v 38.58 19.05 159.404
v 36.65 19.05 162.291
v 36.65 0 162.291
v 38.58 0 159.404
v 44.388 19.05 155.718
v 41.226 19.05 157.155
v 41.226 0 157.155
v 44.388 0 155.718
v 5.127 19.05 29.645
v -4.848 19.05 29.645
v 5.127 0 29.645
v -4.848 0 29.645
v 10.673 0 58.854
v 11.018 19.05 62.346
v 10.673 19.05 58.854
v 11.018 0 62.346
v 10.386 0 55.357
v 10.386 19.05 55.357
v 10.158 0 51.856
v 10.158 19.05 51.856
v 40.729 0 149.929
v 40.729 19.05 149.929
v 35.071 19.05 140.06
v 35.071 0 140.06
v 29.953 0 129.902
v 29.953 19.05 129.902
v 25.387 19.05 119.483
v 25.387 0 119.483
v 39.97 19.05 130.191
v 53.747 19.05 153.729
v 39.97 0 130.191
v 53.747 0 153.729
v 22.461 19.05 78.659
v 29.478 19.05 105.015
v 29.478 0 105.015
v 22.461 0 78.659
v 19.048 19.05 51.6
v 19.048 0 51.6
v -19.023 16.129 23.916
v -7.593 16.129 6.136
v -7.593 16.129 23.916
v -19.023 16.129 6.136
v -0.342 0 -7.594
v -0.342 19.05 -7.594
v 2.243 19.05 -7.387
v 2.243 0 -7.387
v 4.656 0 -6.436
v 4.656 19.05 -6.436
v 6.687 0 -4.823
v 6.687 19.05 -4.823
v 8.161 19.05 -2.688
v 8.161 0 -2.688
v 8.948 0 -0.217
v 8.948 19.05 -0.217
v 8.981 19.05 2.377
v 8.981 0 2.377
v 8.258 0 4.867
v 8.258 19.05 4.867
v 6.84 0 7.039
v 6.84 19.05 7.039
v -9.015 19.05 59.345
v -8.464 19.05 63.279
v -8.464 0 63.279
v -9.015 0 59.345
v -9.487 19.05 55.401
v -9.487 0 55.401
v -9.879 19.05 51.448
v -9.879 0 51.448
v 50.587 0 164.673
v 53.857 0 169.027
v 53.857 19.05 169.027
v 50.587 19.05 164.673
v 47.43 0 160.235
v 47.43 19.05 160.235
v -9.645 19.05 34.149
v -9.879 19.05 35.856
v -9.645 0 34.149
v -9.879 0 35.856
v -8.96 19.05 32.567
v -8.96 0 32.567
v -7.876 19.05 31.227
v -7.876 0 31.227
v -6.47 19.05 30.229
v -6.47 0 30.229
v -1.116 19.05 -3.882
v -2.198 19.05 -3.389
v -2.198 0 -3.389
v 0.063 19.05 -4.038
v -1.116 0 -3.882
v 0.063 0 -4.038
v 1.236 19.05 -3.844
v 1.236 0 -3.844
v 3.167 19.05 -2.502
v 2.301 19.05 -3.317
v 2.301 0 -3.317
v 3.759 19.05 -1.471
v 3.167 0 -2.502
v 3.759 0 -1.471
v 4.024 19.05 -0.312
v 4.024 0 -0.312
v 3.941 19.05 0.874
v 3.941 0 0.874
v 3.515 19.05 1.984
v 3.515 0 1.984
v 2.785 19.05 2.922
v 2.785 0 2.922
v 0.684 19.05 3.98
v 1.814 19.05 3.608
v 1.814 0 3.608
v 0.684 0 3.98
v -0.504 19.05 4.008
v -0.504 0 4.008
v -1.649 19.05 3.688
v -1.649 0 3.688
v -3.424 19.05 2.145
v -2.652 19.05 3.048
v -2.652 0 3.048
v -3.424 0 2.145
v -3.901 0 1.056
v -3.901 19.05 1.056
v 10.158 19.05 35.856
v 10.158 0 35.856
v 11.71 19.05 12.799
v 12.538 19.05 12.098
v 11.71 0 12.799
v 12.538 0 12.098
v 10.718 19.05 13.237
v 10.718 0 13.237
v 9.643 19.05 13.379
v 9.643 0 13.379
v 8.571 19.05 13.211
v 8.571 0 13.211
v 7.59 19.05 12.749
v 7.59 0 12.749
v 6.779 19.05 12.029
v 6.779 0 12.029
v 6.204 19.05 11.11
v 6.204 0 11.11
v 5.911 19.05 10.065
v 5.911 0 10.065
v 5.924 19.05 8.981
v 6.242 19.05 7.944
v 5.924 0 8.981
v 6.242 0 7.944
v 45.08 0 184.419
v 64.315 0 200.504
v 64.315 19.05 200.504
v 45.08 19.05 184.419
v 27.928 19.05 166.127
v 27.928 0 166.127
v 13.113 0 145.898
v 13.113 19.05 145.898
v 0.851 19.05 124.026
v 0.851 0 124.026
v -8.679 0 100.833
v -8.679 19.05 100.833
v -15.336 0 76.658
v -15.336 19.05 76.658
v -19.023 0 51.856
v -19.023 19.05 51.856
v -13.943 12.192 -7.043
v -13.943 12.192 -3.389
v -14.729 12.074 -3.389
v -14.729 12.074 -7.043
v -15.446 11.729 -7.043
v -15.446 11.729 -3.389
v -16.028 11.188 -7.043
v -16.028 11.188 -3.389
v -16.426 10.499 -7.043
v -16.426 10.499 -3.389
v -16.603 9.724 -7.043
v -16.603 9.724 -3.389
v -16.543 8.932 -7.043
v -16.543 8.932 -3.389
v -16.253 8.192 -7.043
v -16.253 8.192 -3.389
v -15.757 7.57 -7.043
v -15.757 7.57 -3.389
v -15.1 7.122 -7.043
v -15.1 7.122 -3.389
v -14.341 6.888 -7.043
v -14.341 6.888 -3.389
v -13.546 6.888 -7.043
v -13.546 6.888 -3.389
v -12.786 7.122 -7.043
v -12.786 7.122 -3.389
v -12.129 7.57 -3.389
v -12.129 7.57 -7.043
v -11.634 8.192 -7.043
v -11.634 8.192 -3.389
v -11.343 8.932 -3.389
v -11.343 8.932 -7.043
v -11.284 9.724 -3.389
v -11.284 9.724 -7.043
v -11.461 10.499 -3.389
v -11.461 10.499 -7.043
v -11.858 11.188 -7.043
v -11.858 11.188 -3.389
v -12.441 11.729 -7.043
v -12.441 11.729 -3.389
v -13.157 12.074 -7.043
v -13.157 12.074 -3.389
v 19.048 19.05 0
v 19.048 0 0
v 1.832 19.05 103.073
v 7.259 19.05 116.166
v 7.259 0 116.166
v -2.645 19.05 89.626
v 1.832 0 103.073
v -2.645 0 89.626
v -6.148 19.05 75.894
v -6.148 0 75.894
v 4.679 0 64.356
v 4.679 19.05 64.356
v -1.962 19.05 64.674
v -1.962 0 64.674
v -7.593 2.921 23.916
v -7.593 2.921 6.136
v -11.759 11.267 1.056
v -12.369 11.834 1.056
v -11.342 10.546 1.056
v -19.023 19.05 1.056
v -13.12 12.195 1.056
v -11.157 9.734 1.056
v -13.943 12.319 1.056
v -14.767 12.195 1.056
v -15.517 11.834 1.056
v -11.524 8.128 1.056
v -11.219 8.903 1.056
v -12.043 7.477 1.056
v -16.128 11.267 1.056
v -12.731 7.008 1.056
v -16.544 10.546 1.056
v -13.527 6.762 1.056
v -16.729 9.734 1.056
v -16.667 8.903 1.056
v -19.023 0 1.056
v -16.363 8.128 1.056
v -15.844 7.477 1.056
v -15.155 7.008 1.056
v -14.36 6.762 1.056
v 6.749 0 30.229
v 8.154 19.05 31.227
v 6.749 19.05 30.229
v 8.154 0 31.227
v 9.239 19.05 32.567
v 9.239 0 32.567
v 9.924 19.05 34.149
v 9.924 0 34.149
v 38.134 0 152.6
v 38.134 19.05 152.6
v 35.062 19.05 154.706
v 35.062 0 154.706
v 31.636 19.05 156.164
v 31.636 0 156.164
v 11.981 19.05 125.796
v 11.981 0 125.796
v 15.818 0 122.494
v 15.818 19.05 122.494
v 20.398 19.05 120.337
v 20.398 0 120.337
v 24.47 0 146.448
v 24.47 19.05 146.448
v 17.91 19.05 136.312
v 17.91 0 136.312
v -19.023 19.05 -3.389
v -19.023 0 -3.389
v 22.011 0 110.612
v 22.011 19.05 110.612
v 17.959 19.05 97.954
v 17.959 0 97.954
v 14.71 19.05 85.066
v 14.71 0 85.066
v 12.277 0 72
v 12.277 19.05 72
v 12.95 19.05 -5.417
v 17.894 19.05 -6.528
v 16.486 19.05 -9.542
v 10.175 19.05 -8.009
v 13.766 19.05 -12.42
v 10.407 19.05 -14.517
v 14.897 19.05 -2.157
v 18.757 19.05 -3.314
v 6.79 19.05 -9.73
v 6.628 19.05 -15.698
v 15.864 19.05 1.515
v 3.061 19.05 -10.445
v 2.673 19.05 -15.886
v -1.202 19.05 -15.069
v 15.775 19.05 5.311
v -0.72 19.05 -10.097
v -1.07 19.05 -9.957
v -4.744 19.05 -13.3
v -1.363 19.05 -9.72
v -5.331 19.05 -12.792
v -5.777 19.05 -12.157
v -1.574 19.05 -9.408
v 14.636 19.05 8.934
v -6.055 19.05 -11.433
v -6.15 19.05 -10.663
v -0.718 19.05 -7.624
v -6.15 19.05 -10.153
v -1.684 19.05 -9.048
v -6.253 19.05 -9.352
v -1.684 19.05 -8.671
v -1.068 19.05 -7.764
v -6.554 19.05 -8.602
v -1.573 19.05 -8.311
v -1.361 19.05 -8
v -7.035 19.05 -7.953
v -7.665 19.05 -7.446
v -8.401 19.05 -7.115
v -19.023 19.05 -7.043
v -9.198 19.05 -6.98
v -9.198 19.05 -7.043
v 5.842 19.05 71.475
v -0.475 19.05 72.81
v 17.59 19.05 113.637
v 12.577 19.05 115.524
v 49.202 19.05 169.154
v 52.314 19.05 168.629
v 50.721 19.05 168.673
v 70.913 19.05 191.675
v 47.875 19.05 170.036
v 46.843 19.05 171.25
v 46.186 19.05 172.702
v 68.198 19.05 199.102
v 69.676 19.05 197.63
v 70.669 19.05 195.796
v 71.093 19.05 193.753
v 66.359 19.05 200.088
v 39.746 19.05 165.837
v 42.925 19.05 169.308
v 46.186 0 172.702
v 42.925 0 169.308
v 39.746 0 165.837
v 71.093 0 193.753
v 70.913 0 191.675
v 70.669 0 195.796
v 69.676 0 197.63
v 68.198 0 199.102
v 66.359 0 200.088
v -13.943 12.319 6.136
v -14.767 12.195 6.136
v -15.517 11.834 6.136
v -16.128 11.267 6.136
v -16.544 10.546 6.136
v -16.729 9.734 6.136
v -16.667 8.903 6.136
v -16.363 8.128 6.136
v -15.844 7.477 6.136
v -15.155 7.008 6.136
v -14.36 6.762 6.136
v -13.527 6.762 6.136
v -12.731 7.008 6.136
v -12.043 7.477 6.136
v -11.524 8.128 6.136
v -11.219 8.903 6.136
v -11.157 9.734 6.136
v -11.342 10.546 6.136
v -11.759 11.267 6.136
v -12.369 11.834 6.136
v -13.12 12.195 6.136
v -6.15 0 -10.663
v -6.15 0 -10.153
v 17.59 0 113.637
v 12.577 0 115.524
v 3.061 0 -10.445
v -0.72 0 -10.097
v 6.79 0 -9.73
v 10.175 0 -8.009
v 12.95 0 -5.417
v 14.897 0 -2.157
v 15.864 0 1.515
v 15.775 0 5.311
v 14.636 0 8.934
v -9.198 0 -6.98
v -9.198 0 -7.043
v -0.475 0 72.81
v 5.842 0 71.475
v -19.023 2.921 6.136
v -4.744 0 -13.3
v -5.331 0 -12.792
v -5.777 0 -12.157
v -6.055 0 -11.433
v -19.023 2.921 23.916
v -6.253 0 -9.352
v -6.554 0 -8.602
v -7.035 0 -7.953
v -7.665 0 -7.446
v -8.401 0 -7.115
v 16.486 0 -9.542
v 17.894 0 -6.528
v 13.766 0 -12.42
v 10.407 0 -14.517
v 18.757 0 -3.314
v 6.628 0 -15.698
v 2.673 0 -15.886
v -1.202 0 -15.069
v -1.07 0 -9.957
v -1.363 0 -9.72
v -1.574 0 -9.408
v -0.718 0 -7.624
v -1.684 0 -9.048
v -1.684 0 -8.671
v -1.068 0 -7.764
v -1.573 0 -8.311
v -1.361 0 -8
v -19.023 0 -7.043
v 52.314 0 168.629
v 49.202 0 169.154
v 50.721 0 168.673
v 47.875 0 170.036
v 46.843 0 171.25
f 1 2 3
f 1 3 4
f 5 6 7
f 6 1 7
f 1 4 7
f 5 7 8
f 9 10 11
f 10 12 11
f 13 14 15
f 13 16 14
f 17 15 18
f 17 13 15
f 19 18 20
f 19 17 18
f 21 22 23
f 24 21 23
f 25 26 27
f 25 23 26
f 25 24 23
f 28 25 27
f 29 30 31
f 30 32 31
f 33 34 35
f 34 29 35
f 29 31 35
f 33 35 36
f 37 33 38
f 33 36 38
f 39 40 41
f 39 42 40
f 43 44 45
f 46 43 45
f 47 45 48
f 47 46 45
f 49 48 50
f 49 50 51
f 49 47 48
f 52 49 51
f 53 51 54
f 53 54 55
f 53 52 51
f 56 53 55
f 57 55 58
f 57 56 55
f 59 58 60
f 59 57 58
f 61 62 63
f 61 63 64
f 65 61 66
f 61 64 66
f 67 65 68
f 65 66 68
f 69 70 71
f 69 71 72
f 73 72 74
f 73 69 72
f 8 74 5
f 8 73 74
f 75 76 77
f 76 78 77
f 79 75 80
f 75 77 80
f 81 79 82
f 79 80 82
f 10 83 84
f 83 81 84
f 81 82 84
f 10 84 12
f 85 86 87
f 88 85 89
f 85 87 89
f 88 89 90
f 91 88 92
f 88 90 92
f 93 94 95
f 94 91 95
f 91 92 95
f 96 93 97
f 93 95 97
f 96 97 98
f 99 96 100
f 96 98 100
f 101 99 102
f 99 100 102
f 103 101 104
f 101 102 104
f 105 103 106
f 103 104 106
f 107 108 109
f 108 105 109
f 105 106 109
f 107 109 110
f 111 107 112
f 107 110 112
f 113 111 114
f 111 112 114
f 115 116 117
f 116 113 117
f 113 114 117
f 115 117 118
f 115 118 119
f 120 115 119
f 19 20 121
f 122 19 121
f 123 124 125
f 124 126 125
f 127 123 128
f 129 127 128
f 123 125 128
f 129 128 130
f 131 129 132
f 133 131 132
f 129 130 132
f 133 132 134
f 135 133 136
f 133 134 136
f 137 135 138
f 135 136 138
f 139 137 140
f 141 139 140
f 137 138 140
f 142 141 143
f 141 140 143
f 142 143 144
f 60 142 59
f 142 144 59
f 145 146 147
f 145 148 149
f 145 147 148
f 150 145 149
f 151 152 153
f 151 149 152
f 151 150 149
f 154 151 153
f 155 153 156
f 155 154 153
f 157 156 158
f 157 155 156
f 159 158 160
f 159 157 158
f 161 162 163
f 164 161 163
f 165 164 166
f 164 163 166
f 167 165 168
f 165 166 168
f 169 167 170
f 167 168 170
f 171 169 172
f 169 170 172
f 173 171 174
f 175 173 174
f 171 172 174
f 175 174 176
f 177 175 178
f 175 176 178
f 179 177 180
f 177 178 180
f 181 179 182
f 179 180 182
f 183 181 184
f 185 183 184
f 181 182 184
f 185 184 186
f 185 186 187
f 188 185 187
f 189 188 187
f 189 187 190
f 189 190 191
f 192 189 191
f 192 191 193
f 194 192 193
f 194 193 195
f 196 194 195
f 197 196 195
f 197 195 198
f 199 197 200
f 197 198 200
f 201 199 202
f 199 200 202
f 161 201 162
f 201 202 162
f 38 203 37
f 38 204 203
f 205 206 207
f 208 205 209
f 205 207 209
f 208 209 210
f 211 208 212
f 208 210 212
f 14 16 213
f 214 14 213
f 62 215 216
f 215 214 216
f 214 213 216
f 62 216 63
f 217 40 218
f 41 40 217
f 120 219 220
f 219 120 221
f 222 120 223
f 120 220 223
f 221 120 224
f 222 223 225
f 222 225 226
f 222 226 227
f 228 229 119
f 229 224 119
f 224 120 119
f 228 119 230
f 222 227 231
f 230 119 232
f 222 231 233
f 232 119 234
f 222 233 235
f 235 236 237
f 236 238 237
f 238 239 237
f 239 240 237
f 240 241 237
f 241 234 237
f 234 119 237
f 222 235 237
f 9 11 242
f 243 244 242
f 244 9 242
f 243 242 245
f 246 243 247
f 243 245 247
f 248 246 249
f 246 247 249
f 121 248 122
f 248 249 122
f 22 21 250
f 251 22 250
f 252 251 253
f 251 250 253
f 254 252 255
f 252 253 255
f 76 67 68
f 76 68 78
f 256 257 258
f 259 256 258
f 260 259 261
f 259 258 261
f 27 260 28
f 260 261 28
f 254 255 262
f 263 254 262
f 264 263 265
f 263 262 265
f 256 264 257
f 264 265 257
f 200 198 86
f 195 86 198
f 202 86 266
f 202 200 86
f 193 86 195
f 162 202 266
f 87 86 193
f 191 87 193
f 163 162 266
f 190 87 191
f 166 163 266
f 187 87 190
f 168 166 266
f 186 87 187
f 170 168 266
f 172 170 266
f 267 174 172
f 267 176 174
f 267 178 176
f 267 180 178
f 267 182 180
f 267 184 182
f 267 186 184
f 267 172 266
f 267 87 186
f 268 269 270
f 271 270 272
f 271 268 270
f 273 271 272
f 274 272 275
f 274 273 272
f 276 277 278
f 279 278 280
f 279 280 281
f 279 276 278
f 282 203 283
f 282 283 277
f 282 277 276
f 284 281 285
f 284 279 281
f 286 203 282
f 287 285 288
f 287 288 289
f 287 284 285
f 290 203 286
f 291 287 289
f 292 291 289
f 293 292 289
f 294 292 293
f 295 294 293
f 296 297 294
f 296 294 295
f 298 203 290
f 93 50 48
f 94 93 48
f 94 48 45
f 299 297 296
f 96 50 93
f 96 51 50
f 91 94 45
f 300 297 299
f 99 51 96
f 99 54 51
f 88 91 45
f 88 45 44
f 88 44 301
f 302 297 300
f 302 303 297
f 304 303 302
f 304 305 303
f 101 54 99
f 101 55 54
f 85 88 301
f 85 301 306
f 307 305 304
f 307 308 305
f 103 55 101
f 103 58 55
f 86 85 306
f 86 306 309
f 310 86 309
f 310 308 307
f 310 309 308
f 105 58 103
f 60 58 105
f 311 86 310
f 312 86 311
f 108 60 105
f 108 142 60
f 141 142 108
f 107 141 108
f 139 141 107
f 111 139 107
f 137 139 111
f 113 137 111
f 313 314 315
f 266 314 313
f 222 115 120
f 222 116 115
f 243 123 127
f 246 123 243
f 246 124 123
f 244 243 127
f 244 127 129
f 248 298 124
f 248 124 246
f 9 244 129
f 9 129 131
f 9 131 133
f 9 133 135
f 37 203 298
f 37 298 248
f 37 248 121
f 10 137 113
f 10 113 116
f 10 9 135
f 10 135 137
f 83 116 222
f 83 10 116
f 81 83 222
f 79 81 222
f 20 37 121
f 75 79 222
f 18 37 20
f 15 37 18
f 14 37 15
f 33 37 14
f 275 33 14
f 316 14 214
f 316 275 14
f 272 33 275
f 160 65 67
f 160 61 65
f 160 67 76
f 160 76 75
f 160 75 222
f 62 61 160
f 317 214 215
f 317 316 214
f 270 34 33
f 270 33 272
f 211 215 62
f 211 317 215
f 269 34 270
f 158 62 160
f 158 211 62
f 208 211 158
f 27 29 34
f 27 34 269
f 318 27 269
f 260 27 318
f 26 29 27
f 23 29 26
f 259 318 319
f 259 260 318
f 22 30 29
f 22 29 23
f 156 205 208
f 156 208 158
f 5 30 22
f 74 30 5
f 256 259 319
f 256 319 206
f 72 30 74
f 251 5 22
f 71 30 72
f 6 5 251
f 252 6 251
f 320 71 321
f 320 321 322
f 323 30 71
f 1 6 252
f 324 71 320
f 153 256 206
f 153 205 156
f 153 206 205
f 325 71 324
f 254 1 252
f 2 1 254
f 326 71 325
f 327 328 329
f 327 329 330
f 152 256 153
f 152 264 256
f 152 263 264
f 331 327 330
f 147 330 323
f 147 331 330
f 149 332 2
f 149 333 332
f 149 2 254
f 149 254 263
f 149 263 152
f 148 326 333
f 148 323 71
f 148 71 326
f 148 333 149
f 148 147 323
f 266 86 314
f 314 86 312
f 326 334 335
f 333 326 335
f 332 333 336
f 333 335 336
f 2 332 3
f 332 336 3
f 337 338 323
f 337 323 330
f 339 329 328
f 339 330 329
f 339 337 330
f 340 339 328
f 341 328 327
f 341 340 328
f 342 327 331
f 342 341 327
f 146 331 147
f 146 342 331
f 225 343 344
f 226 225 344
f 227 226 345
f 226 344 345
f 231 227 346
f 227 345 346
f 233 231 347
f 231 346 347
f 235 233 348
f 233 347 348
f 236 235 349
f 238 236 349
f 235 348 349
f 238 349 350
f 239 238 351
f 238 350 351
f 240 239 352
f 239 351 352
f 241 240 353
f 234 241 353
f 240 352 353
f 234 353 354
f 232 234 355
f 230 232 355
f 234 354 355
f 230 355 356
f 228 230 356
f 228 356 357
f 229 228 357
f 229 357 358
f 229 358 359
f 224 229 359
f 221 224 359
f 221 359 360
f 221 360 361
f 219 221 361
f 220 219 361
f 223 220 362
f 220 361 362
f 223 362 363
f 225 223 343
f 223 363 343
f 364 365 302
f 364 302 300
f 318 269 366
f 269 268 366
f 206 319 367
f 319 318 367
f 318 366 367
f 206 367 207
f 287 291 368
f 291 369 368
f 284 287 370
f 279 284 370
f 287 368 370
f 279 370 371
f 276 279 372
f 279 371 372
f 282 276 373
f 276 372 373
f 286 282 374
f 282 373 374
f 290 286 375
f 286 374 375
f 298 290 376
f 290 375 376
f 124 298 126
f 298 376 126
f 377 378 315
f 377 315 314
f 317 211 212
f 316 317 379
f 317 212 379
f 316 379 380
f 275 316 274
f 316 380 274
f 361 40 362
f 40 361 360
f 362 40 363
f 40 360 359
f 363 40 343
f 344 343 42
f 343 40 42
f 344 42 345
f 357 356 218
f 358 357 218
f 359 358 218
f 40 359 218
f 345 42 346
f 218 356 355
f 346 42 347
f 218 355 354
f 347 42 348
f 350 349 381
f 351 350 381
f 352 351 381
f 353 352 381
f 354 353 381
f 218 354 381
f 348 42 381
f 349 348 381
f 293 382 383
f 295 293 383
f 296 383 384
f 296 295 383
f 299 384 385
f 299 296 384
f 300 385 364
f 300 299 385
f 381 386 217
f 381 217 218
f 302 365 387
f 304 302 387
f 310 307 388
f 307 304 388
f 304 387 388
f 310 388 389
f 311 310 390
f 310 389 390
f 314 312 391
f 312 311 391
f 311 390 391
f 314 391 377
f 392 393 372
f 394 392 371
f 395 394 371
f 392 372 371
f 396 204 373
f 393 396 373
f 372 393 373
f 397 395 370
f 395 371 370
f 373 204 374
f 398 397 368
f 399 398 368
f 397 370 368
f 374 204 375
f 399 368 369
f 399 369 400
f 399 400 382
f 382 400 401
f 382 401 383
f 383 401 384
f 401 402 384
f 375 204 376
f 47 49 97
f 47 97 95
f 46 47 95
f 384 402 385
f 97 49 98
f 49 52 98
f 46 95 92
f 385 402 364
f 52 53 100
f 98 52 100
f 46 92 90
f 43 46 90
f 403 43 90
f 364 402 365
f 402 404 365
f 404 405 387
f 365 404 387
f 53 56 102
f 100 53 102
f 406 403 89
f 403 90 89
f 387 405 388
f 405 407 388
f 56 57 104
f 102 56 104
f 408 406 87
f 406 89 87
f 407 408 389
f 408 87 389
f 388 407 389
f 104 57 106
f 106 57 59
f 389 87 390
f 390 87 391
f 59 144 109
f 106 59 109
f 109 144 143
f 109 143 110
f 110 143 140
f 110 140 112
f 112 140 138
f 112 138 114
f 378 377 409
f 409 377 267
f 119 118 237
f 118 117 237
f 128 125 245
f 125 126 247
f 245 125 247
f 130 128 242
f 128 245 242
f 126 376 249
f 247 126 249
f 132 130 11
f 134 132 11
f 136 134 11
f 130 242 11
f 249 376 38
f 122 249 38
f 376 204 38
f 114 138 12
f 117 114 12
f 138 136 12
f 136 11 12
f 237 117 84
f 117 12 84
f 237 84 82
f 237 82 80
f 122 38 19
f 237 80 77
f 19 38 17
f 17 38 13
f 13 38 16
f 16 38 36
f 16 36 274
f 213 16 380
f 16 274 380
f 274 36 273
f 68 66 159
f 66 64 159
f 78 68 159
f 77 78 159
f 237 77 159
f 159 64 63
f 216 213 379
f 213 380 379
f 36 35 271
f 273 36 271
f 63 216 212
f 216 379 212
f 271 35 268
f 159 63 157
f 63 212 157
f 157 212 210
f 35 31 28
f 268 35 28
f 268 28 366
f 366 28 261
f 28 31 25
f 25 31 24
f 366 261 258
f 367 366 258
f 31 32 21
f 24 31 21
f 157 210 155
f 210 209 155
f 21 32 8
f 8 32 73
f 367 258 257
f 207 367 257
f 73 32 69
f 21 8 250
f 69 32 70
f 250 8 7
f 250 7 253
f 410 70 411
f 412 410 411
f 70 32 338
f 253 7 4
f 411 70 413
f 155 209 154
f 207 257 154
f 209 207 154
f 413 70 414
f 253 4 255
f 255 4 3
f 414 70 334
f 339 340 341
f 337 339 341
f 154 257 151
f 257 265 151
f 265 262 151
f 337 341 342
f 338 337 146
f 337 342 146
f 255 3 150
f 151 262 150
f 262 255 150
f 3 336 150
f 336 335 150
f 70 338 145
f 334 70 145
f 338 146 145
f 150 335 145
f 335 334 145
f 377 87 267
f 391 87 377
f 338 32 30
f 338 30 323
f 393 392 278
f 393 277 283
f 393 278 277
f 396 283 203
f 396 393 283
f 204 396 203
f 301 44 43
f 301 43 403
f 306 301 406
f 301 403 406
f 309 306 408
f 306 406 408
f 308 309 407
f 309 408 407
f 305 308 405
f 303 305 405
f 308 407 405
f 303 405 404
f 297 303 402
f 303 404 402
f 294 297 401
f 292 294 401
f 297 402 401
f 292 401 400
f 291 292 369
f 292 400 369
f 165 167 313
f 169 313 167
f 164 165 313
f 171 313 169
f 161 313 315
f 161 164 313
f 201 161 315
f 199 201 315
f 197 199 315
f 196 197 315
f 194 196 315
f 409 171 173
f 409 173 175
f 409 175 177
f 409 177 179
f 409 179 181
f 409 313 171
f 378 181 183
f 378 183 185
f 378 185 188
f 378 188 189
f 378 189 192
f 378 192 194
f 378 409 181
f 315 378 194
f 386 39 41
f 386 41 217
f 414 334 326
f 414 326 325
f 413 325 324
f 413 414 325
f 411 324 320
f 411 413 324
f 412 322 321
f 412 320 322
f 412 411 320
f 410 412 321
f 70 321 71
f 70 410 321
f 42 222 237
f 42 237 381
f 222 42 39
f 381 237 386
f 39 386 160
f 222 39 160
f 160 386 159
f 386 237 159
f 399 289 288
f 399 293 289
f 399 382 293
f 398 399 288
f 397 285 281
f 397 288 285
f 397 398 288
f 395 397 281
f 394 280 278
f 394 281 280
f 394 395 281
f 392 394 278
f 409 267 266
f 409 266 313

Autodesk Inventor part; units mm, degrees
ref_plane "YZ Plane" through (0, 0, 0) normal (1, 0, 0) x (0, 1, 0)
ref_plane "XZ Plane" through (0, 0, 0) normal (0, 1, 0) x (-1, 0, 0)
ref_plane "XY Plane" through (0, 0, 0) normal (0, 0, 1) x (1, 0, 0)
sketch "Sketch1" plane through (0, 0, 0) normal (0, 1, 0) x (-1, 0, 0)
  arc A0 (3.9007, 1.0556) -> (2.1982, -3.3894) centre (0.0024, 0.0001) ccw
  arc A1 (19.0232, 1.0556) -> (-16.4856, -9.5418) centre (0.0024, 0.0001) ccw
  line L0 (3.9007, 1.0556) -> (19.0232, 1.0556)
  line L1 (2.1982, -3.3894) -> (19.0232, -3.3894)
  line L2 (19.0232, -7.0431) -> (11.658, -7.0431)
  line L3 (19.0232, -3.3894) -> (19.0232, -7.0431)
  arc A2 (-16.4856, -9.5418) -> (7.4534, -10.991) centre (-3.9181, -0.3889) ccw
  line L4 (19.0232, 1.0556) -> (19.0232, 51.8556)
  line L5 (-19.0476, 0.0001) -> (-19.0476, 51.8556)
  line L6 (-19.0476, 0.0001) -> (-19.4605, 0.0001)
  arc A3 (19.0232, 51.8556) -> (-64.3153, 200.5038) centre (-187.3249, 33.8538) ccw
  arc A4 (-19.0476, 51.5998) -> (-53.7472, 153.729) centre (-221.3606, 39.8209) ccw
  line L7 (9.8792, 51.4484) -> (9.8792, 35.8565)
  arc A5 (-10.1576, 51.8556) -> (-53.8573, 169.027) centre (-221.3606, 39.8209) ccw
  line L8 (-10.1576, 51.8556) -> (-10.1576, 35.8565)
  line L9 (9.8792, 23.8284) -> (-10.1576, 23.8284) construction
  line L10 (9.8792, 23.8284) -> (29.9159, 23.8284) construction
  arc A6 (4.8483, 29.6451) -> (9.8792, 35.8565) centre (3.5292, 35.8565) ccw
  arc A7 (-10.1576, 35.8565) -> (-5.1267, 29.6451) centre (-3.8076, 35.8565) ccw
  line L11 (4.8483, 29.6451) -> (-5.1267, 29.6451)
  arc A8 (19.0232, 51.8556) -> (-64.3153, 200.5038) centre (-187.3249, 33.8538) ccw
  arc A9 (-31.6355, 156.1642) -> (-40.7288, 149.9287) centre (-26.0329, 138.2456) ccw
  arc A10 (-25.3873, 119.4827) -> (-11.9806, 125.796) centre (-26.0329, 138.2456) ccw
  arc A11 (-7.259, 116.1658) -> (-22.0111, 110.6115) centre (-7.259, 93.7981) ccw
  arc A12 (-12.2768, 72.0005) -> (6.1478, 75.8935) centre (-7.259, 93.7981) ccw
  arc A13 (8.4637, 63.2789) -> (-11.0177, 62.3465) centre (-0.1392, 39.0411) ccw
  arc A14 (-44.388, 155.7184) -> (-36.6502, 162.2912) centre (-47.9514, 167.7544) ccw
  line L12 (7.4534, -9.5831) -> (7.4534, -10.991)
  line L13 (11.658, -7.0431) -> (9.9934, -7.0431)
  line L14 (9.9934, -7.0431) -> (7.4534, -7.0431)
  line L15 (7.4534, -7.0431) -> (7.4534, -9.5831)
  line L16 (-53.7472, 153.729) -> (-70.9133, 191.6752)
  arc A15 (-64.3153, 200.5038) -> (-70.9133, 191.6752) centre (-63.9188, 193.3277) ccw
  arc A16 (-53.8573, 169.027) -> (-46.1861, 172.7021) centre (-51.6725, 174.3104) ccw
  arc A17 (9.8792, 51.4484) -> (-46.1861, 172.7021) centre (-187.3249, 33.8538) ccw
  point P0 (-0.1392, 29.6451)
  point P1 (19.0232, 1.0556)
  point P2 (-64.3153, 200.5038)
  point P3 (7.4534, 1.0556)
  dimension "d17" = 8.0772
  dimension "d19" = 4.445
  dimension "d22" = 50.8
  dimension "d27" = 8.89
  dimension "d28" = 8.89
  dimension "d31" = 180
  dimension "d32" = 6.35
  dimension "d33" = 207.1318
  dimension "d34" = 33.8537
  dimension "d35" = 29.6449
  dimension "d36" = 19.05
  dimension "d37" = 3.3895
extrude "Extrusion1" add sketch "Sketch1" along normal blind 19.05 contours A0 L1 L3 L2 L13 L14 L15 L12 A2 A1 L0 | A1 L5 A4 L16 A15 A3 L4 | A13 A5 A12 A17 | A11 A5 A10 A17 | A9 A5 A14 A17
fillet "Fillet1" radius 1.27 1 edges at (-7.4534, 9.525, -7.0431)
sketch "Sketch2" plane through (-19.0232, 0, -7.0431) normal (0, 0, -1) x (-1, 0, 0)
  line L0 (0, 0) -> (0, 19.05) projected
  line L1 (-10.2998, 19.05) -> (0, 19.05) projected
  point P0 (-19.0232, 0)
  point P1 (-5.08, 9.525)
  point P2 (0, 9.525)
  point P3 (-5.1499, 19.05)
  dimension "d44" = 5.08
  dimension "d45" = 9.525
hole "Hole1" at (-13.9432, 9.525, -7.0431) direction (0, 0, 1) diameter 5.334 end up to surface
sketch "Sketch3" plane through (-3.9007, 0, 1.0556) normal (0, 0, -1) x (-1, 0, 0)
  circle A0 centre (10.0425, 9.525) radius 2.667 projected
  point P0 (-3.9007, 0)
hole "Hole2" at (-13.9432, 9.525, 1.0556) direction (0, 0, 1) diameter 5.588 depth 10.16
sketch "Sketch4" plane through (-19.0232, 0, 1.0556) normal (-1, 0, 0) x (0, 0, 1)
  line L0 (0, 6.731) -> (0, 12.319) projected
  line L1 (10.16, 12.319) -> (10.16, 6.731) projected
  line L2 (0, 6.731) -> (5.08, 6.731)
  line L3 (10.16, 6.731) -> (0, 6.731) projected
  line L4 (0, 12.319) -> (5.08, 12.319)
  line L5 (10.16, 12.319) -> (0, 12.319) projected
  line L6 (0, 0) -> (50.8, 0) projected
  line L7 (0, 9.525) -> (16.1442, 9.525) construction
  line L8 (5.08, 9.525) -> (5.08, 2.921)
  line L9 (5.08, 9.525) -> (5.08, 16.129)
  line L10 (5.08, 16.129) -> (22.86, 16.129)
  line L11 (22.86, 16.129) -> (22.86, 2.921)
  line L12 (22.86, 2.921) -> (5.08, 2.921)
  point P0 (-1.0556, 0)
  dimension "d63" = 5.08
  dimension "d65" = 6.604
  dimension "d66" = 6.604
  dimension "d67" = 17.78
extrude "Extrusion2" cut sketch "Sketch4" against normal blind 11.43 contours L8 L9 L5 L1 L3 | L3 L1 L5 L9 L10 L11 L12 L8
sketch "Sketch6" plane through (0, 0, 0) normal (0, -1, 0) x (1, 0, 0)
  circle A0 centre (-0.4283, -8.8611) radius 1.27
  circle A1 centre (9.6886, 9.5689) radius 3.81
  arc A2 (-0.3421, -7.594) -> (6.8398, 7.039) centre (0.2554, 1.1917) ccw
  arc A3 (-0.7205, -10.097) -> (12.5379, 12.0984) centre (2.3988, 3.0973) ccw
  arc A4 (-7.4534, -10.991) -> (16.4856, -9.5418) centre (3.9181, -0.3889) ccw projected
  line L0 (-9.198, -6.9778) -> (-6.15, -6.9778)
  line L1 (-6.15, -6.9778) -> (-6.15, -12.2358)
  line L2 (-6.15, -12.2358) -> (-9.198, -12.2358)
  line L3 (-9.198, -12.2358) -> (-9.198, -6.9778)
  point P0 (0, 0)
  dimension "d90" = 3.048
  dimension "d91" = 2.54
extrude "Extrusion4" cut sketch "Sketch6" against normal blind 25.4
fillet "Fillet2" radius 3.175 1 edges at (-6.15, 9.525, -6.9778)
fillet "Fillet3" radius 3.175 1 edges at (-6.15, 9.525, -12.2358)
sketch "Sketch9" plane through (0, 0, 0) normal (0, -1, 0) x (1, 0, 0)
  point P0 (0, 0)
sketch "Sketch7" plane through (0, 0, 0) normal (0, -1, 0) x (1, 0, 0)
  circle A0 centre (0, 0) radius 5.1181
  dimension "d96" = 10.2362
sketch "Sketch8" plane through (0, 0, 0) normal (0, -1, 0) x (1, 0, 0)
  arc A0 (-3.835, -3.3894) -> (-5.0081, 1.0556) centre (0, 0) ccw projected
  arc A1 (-0.3421, -7.594) -> (6.8398, 7.039) centre (0.2554, 1.1917) ccw projected
  arc A2 (12.5379, 12.0984) -> (6.8398, 7.039) centre (9.6886, 9.5689) ccw projected
  arc A3 (-0.7205, -10.097) -> (12.5379, 12.0984) centre (2.3988, 3.0973) ccw projected
  arc A4 (-0.3421, -7.594) -> (-0.7205, -10.097) centre (-0.4283, -8.8611) ccw projected
  circle A5 centre (9.6886, 9.5689) radius 3.81
  circle A6 centre (-0.4283, -8.8611) radius 1.27
  arc A7 (-0.3421, -7.594) -> (6.8398, 7.039) centre (1.573, 0.545) ccw
  point P0 (0.0088, -7.6687)
  point P1 (7.474, 6.4687)
  point P2 (6.8398, 7.039)
  point P3 (-0.3421, -7.594)
properties part number "Central Claw V2_3DPrint"
